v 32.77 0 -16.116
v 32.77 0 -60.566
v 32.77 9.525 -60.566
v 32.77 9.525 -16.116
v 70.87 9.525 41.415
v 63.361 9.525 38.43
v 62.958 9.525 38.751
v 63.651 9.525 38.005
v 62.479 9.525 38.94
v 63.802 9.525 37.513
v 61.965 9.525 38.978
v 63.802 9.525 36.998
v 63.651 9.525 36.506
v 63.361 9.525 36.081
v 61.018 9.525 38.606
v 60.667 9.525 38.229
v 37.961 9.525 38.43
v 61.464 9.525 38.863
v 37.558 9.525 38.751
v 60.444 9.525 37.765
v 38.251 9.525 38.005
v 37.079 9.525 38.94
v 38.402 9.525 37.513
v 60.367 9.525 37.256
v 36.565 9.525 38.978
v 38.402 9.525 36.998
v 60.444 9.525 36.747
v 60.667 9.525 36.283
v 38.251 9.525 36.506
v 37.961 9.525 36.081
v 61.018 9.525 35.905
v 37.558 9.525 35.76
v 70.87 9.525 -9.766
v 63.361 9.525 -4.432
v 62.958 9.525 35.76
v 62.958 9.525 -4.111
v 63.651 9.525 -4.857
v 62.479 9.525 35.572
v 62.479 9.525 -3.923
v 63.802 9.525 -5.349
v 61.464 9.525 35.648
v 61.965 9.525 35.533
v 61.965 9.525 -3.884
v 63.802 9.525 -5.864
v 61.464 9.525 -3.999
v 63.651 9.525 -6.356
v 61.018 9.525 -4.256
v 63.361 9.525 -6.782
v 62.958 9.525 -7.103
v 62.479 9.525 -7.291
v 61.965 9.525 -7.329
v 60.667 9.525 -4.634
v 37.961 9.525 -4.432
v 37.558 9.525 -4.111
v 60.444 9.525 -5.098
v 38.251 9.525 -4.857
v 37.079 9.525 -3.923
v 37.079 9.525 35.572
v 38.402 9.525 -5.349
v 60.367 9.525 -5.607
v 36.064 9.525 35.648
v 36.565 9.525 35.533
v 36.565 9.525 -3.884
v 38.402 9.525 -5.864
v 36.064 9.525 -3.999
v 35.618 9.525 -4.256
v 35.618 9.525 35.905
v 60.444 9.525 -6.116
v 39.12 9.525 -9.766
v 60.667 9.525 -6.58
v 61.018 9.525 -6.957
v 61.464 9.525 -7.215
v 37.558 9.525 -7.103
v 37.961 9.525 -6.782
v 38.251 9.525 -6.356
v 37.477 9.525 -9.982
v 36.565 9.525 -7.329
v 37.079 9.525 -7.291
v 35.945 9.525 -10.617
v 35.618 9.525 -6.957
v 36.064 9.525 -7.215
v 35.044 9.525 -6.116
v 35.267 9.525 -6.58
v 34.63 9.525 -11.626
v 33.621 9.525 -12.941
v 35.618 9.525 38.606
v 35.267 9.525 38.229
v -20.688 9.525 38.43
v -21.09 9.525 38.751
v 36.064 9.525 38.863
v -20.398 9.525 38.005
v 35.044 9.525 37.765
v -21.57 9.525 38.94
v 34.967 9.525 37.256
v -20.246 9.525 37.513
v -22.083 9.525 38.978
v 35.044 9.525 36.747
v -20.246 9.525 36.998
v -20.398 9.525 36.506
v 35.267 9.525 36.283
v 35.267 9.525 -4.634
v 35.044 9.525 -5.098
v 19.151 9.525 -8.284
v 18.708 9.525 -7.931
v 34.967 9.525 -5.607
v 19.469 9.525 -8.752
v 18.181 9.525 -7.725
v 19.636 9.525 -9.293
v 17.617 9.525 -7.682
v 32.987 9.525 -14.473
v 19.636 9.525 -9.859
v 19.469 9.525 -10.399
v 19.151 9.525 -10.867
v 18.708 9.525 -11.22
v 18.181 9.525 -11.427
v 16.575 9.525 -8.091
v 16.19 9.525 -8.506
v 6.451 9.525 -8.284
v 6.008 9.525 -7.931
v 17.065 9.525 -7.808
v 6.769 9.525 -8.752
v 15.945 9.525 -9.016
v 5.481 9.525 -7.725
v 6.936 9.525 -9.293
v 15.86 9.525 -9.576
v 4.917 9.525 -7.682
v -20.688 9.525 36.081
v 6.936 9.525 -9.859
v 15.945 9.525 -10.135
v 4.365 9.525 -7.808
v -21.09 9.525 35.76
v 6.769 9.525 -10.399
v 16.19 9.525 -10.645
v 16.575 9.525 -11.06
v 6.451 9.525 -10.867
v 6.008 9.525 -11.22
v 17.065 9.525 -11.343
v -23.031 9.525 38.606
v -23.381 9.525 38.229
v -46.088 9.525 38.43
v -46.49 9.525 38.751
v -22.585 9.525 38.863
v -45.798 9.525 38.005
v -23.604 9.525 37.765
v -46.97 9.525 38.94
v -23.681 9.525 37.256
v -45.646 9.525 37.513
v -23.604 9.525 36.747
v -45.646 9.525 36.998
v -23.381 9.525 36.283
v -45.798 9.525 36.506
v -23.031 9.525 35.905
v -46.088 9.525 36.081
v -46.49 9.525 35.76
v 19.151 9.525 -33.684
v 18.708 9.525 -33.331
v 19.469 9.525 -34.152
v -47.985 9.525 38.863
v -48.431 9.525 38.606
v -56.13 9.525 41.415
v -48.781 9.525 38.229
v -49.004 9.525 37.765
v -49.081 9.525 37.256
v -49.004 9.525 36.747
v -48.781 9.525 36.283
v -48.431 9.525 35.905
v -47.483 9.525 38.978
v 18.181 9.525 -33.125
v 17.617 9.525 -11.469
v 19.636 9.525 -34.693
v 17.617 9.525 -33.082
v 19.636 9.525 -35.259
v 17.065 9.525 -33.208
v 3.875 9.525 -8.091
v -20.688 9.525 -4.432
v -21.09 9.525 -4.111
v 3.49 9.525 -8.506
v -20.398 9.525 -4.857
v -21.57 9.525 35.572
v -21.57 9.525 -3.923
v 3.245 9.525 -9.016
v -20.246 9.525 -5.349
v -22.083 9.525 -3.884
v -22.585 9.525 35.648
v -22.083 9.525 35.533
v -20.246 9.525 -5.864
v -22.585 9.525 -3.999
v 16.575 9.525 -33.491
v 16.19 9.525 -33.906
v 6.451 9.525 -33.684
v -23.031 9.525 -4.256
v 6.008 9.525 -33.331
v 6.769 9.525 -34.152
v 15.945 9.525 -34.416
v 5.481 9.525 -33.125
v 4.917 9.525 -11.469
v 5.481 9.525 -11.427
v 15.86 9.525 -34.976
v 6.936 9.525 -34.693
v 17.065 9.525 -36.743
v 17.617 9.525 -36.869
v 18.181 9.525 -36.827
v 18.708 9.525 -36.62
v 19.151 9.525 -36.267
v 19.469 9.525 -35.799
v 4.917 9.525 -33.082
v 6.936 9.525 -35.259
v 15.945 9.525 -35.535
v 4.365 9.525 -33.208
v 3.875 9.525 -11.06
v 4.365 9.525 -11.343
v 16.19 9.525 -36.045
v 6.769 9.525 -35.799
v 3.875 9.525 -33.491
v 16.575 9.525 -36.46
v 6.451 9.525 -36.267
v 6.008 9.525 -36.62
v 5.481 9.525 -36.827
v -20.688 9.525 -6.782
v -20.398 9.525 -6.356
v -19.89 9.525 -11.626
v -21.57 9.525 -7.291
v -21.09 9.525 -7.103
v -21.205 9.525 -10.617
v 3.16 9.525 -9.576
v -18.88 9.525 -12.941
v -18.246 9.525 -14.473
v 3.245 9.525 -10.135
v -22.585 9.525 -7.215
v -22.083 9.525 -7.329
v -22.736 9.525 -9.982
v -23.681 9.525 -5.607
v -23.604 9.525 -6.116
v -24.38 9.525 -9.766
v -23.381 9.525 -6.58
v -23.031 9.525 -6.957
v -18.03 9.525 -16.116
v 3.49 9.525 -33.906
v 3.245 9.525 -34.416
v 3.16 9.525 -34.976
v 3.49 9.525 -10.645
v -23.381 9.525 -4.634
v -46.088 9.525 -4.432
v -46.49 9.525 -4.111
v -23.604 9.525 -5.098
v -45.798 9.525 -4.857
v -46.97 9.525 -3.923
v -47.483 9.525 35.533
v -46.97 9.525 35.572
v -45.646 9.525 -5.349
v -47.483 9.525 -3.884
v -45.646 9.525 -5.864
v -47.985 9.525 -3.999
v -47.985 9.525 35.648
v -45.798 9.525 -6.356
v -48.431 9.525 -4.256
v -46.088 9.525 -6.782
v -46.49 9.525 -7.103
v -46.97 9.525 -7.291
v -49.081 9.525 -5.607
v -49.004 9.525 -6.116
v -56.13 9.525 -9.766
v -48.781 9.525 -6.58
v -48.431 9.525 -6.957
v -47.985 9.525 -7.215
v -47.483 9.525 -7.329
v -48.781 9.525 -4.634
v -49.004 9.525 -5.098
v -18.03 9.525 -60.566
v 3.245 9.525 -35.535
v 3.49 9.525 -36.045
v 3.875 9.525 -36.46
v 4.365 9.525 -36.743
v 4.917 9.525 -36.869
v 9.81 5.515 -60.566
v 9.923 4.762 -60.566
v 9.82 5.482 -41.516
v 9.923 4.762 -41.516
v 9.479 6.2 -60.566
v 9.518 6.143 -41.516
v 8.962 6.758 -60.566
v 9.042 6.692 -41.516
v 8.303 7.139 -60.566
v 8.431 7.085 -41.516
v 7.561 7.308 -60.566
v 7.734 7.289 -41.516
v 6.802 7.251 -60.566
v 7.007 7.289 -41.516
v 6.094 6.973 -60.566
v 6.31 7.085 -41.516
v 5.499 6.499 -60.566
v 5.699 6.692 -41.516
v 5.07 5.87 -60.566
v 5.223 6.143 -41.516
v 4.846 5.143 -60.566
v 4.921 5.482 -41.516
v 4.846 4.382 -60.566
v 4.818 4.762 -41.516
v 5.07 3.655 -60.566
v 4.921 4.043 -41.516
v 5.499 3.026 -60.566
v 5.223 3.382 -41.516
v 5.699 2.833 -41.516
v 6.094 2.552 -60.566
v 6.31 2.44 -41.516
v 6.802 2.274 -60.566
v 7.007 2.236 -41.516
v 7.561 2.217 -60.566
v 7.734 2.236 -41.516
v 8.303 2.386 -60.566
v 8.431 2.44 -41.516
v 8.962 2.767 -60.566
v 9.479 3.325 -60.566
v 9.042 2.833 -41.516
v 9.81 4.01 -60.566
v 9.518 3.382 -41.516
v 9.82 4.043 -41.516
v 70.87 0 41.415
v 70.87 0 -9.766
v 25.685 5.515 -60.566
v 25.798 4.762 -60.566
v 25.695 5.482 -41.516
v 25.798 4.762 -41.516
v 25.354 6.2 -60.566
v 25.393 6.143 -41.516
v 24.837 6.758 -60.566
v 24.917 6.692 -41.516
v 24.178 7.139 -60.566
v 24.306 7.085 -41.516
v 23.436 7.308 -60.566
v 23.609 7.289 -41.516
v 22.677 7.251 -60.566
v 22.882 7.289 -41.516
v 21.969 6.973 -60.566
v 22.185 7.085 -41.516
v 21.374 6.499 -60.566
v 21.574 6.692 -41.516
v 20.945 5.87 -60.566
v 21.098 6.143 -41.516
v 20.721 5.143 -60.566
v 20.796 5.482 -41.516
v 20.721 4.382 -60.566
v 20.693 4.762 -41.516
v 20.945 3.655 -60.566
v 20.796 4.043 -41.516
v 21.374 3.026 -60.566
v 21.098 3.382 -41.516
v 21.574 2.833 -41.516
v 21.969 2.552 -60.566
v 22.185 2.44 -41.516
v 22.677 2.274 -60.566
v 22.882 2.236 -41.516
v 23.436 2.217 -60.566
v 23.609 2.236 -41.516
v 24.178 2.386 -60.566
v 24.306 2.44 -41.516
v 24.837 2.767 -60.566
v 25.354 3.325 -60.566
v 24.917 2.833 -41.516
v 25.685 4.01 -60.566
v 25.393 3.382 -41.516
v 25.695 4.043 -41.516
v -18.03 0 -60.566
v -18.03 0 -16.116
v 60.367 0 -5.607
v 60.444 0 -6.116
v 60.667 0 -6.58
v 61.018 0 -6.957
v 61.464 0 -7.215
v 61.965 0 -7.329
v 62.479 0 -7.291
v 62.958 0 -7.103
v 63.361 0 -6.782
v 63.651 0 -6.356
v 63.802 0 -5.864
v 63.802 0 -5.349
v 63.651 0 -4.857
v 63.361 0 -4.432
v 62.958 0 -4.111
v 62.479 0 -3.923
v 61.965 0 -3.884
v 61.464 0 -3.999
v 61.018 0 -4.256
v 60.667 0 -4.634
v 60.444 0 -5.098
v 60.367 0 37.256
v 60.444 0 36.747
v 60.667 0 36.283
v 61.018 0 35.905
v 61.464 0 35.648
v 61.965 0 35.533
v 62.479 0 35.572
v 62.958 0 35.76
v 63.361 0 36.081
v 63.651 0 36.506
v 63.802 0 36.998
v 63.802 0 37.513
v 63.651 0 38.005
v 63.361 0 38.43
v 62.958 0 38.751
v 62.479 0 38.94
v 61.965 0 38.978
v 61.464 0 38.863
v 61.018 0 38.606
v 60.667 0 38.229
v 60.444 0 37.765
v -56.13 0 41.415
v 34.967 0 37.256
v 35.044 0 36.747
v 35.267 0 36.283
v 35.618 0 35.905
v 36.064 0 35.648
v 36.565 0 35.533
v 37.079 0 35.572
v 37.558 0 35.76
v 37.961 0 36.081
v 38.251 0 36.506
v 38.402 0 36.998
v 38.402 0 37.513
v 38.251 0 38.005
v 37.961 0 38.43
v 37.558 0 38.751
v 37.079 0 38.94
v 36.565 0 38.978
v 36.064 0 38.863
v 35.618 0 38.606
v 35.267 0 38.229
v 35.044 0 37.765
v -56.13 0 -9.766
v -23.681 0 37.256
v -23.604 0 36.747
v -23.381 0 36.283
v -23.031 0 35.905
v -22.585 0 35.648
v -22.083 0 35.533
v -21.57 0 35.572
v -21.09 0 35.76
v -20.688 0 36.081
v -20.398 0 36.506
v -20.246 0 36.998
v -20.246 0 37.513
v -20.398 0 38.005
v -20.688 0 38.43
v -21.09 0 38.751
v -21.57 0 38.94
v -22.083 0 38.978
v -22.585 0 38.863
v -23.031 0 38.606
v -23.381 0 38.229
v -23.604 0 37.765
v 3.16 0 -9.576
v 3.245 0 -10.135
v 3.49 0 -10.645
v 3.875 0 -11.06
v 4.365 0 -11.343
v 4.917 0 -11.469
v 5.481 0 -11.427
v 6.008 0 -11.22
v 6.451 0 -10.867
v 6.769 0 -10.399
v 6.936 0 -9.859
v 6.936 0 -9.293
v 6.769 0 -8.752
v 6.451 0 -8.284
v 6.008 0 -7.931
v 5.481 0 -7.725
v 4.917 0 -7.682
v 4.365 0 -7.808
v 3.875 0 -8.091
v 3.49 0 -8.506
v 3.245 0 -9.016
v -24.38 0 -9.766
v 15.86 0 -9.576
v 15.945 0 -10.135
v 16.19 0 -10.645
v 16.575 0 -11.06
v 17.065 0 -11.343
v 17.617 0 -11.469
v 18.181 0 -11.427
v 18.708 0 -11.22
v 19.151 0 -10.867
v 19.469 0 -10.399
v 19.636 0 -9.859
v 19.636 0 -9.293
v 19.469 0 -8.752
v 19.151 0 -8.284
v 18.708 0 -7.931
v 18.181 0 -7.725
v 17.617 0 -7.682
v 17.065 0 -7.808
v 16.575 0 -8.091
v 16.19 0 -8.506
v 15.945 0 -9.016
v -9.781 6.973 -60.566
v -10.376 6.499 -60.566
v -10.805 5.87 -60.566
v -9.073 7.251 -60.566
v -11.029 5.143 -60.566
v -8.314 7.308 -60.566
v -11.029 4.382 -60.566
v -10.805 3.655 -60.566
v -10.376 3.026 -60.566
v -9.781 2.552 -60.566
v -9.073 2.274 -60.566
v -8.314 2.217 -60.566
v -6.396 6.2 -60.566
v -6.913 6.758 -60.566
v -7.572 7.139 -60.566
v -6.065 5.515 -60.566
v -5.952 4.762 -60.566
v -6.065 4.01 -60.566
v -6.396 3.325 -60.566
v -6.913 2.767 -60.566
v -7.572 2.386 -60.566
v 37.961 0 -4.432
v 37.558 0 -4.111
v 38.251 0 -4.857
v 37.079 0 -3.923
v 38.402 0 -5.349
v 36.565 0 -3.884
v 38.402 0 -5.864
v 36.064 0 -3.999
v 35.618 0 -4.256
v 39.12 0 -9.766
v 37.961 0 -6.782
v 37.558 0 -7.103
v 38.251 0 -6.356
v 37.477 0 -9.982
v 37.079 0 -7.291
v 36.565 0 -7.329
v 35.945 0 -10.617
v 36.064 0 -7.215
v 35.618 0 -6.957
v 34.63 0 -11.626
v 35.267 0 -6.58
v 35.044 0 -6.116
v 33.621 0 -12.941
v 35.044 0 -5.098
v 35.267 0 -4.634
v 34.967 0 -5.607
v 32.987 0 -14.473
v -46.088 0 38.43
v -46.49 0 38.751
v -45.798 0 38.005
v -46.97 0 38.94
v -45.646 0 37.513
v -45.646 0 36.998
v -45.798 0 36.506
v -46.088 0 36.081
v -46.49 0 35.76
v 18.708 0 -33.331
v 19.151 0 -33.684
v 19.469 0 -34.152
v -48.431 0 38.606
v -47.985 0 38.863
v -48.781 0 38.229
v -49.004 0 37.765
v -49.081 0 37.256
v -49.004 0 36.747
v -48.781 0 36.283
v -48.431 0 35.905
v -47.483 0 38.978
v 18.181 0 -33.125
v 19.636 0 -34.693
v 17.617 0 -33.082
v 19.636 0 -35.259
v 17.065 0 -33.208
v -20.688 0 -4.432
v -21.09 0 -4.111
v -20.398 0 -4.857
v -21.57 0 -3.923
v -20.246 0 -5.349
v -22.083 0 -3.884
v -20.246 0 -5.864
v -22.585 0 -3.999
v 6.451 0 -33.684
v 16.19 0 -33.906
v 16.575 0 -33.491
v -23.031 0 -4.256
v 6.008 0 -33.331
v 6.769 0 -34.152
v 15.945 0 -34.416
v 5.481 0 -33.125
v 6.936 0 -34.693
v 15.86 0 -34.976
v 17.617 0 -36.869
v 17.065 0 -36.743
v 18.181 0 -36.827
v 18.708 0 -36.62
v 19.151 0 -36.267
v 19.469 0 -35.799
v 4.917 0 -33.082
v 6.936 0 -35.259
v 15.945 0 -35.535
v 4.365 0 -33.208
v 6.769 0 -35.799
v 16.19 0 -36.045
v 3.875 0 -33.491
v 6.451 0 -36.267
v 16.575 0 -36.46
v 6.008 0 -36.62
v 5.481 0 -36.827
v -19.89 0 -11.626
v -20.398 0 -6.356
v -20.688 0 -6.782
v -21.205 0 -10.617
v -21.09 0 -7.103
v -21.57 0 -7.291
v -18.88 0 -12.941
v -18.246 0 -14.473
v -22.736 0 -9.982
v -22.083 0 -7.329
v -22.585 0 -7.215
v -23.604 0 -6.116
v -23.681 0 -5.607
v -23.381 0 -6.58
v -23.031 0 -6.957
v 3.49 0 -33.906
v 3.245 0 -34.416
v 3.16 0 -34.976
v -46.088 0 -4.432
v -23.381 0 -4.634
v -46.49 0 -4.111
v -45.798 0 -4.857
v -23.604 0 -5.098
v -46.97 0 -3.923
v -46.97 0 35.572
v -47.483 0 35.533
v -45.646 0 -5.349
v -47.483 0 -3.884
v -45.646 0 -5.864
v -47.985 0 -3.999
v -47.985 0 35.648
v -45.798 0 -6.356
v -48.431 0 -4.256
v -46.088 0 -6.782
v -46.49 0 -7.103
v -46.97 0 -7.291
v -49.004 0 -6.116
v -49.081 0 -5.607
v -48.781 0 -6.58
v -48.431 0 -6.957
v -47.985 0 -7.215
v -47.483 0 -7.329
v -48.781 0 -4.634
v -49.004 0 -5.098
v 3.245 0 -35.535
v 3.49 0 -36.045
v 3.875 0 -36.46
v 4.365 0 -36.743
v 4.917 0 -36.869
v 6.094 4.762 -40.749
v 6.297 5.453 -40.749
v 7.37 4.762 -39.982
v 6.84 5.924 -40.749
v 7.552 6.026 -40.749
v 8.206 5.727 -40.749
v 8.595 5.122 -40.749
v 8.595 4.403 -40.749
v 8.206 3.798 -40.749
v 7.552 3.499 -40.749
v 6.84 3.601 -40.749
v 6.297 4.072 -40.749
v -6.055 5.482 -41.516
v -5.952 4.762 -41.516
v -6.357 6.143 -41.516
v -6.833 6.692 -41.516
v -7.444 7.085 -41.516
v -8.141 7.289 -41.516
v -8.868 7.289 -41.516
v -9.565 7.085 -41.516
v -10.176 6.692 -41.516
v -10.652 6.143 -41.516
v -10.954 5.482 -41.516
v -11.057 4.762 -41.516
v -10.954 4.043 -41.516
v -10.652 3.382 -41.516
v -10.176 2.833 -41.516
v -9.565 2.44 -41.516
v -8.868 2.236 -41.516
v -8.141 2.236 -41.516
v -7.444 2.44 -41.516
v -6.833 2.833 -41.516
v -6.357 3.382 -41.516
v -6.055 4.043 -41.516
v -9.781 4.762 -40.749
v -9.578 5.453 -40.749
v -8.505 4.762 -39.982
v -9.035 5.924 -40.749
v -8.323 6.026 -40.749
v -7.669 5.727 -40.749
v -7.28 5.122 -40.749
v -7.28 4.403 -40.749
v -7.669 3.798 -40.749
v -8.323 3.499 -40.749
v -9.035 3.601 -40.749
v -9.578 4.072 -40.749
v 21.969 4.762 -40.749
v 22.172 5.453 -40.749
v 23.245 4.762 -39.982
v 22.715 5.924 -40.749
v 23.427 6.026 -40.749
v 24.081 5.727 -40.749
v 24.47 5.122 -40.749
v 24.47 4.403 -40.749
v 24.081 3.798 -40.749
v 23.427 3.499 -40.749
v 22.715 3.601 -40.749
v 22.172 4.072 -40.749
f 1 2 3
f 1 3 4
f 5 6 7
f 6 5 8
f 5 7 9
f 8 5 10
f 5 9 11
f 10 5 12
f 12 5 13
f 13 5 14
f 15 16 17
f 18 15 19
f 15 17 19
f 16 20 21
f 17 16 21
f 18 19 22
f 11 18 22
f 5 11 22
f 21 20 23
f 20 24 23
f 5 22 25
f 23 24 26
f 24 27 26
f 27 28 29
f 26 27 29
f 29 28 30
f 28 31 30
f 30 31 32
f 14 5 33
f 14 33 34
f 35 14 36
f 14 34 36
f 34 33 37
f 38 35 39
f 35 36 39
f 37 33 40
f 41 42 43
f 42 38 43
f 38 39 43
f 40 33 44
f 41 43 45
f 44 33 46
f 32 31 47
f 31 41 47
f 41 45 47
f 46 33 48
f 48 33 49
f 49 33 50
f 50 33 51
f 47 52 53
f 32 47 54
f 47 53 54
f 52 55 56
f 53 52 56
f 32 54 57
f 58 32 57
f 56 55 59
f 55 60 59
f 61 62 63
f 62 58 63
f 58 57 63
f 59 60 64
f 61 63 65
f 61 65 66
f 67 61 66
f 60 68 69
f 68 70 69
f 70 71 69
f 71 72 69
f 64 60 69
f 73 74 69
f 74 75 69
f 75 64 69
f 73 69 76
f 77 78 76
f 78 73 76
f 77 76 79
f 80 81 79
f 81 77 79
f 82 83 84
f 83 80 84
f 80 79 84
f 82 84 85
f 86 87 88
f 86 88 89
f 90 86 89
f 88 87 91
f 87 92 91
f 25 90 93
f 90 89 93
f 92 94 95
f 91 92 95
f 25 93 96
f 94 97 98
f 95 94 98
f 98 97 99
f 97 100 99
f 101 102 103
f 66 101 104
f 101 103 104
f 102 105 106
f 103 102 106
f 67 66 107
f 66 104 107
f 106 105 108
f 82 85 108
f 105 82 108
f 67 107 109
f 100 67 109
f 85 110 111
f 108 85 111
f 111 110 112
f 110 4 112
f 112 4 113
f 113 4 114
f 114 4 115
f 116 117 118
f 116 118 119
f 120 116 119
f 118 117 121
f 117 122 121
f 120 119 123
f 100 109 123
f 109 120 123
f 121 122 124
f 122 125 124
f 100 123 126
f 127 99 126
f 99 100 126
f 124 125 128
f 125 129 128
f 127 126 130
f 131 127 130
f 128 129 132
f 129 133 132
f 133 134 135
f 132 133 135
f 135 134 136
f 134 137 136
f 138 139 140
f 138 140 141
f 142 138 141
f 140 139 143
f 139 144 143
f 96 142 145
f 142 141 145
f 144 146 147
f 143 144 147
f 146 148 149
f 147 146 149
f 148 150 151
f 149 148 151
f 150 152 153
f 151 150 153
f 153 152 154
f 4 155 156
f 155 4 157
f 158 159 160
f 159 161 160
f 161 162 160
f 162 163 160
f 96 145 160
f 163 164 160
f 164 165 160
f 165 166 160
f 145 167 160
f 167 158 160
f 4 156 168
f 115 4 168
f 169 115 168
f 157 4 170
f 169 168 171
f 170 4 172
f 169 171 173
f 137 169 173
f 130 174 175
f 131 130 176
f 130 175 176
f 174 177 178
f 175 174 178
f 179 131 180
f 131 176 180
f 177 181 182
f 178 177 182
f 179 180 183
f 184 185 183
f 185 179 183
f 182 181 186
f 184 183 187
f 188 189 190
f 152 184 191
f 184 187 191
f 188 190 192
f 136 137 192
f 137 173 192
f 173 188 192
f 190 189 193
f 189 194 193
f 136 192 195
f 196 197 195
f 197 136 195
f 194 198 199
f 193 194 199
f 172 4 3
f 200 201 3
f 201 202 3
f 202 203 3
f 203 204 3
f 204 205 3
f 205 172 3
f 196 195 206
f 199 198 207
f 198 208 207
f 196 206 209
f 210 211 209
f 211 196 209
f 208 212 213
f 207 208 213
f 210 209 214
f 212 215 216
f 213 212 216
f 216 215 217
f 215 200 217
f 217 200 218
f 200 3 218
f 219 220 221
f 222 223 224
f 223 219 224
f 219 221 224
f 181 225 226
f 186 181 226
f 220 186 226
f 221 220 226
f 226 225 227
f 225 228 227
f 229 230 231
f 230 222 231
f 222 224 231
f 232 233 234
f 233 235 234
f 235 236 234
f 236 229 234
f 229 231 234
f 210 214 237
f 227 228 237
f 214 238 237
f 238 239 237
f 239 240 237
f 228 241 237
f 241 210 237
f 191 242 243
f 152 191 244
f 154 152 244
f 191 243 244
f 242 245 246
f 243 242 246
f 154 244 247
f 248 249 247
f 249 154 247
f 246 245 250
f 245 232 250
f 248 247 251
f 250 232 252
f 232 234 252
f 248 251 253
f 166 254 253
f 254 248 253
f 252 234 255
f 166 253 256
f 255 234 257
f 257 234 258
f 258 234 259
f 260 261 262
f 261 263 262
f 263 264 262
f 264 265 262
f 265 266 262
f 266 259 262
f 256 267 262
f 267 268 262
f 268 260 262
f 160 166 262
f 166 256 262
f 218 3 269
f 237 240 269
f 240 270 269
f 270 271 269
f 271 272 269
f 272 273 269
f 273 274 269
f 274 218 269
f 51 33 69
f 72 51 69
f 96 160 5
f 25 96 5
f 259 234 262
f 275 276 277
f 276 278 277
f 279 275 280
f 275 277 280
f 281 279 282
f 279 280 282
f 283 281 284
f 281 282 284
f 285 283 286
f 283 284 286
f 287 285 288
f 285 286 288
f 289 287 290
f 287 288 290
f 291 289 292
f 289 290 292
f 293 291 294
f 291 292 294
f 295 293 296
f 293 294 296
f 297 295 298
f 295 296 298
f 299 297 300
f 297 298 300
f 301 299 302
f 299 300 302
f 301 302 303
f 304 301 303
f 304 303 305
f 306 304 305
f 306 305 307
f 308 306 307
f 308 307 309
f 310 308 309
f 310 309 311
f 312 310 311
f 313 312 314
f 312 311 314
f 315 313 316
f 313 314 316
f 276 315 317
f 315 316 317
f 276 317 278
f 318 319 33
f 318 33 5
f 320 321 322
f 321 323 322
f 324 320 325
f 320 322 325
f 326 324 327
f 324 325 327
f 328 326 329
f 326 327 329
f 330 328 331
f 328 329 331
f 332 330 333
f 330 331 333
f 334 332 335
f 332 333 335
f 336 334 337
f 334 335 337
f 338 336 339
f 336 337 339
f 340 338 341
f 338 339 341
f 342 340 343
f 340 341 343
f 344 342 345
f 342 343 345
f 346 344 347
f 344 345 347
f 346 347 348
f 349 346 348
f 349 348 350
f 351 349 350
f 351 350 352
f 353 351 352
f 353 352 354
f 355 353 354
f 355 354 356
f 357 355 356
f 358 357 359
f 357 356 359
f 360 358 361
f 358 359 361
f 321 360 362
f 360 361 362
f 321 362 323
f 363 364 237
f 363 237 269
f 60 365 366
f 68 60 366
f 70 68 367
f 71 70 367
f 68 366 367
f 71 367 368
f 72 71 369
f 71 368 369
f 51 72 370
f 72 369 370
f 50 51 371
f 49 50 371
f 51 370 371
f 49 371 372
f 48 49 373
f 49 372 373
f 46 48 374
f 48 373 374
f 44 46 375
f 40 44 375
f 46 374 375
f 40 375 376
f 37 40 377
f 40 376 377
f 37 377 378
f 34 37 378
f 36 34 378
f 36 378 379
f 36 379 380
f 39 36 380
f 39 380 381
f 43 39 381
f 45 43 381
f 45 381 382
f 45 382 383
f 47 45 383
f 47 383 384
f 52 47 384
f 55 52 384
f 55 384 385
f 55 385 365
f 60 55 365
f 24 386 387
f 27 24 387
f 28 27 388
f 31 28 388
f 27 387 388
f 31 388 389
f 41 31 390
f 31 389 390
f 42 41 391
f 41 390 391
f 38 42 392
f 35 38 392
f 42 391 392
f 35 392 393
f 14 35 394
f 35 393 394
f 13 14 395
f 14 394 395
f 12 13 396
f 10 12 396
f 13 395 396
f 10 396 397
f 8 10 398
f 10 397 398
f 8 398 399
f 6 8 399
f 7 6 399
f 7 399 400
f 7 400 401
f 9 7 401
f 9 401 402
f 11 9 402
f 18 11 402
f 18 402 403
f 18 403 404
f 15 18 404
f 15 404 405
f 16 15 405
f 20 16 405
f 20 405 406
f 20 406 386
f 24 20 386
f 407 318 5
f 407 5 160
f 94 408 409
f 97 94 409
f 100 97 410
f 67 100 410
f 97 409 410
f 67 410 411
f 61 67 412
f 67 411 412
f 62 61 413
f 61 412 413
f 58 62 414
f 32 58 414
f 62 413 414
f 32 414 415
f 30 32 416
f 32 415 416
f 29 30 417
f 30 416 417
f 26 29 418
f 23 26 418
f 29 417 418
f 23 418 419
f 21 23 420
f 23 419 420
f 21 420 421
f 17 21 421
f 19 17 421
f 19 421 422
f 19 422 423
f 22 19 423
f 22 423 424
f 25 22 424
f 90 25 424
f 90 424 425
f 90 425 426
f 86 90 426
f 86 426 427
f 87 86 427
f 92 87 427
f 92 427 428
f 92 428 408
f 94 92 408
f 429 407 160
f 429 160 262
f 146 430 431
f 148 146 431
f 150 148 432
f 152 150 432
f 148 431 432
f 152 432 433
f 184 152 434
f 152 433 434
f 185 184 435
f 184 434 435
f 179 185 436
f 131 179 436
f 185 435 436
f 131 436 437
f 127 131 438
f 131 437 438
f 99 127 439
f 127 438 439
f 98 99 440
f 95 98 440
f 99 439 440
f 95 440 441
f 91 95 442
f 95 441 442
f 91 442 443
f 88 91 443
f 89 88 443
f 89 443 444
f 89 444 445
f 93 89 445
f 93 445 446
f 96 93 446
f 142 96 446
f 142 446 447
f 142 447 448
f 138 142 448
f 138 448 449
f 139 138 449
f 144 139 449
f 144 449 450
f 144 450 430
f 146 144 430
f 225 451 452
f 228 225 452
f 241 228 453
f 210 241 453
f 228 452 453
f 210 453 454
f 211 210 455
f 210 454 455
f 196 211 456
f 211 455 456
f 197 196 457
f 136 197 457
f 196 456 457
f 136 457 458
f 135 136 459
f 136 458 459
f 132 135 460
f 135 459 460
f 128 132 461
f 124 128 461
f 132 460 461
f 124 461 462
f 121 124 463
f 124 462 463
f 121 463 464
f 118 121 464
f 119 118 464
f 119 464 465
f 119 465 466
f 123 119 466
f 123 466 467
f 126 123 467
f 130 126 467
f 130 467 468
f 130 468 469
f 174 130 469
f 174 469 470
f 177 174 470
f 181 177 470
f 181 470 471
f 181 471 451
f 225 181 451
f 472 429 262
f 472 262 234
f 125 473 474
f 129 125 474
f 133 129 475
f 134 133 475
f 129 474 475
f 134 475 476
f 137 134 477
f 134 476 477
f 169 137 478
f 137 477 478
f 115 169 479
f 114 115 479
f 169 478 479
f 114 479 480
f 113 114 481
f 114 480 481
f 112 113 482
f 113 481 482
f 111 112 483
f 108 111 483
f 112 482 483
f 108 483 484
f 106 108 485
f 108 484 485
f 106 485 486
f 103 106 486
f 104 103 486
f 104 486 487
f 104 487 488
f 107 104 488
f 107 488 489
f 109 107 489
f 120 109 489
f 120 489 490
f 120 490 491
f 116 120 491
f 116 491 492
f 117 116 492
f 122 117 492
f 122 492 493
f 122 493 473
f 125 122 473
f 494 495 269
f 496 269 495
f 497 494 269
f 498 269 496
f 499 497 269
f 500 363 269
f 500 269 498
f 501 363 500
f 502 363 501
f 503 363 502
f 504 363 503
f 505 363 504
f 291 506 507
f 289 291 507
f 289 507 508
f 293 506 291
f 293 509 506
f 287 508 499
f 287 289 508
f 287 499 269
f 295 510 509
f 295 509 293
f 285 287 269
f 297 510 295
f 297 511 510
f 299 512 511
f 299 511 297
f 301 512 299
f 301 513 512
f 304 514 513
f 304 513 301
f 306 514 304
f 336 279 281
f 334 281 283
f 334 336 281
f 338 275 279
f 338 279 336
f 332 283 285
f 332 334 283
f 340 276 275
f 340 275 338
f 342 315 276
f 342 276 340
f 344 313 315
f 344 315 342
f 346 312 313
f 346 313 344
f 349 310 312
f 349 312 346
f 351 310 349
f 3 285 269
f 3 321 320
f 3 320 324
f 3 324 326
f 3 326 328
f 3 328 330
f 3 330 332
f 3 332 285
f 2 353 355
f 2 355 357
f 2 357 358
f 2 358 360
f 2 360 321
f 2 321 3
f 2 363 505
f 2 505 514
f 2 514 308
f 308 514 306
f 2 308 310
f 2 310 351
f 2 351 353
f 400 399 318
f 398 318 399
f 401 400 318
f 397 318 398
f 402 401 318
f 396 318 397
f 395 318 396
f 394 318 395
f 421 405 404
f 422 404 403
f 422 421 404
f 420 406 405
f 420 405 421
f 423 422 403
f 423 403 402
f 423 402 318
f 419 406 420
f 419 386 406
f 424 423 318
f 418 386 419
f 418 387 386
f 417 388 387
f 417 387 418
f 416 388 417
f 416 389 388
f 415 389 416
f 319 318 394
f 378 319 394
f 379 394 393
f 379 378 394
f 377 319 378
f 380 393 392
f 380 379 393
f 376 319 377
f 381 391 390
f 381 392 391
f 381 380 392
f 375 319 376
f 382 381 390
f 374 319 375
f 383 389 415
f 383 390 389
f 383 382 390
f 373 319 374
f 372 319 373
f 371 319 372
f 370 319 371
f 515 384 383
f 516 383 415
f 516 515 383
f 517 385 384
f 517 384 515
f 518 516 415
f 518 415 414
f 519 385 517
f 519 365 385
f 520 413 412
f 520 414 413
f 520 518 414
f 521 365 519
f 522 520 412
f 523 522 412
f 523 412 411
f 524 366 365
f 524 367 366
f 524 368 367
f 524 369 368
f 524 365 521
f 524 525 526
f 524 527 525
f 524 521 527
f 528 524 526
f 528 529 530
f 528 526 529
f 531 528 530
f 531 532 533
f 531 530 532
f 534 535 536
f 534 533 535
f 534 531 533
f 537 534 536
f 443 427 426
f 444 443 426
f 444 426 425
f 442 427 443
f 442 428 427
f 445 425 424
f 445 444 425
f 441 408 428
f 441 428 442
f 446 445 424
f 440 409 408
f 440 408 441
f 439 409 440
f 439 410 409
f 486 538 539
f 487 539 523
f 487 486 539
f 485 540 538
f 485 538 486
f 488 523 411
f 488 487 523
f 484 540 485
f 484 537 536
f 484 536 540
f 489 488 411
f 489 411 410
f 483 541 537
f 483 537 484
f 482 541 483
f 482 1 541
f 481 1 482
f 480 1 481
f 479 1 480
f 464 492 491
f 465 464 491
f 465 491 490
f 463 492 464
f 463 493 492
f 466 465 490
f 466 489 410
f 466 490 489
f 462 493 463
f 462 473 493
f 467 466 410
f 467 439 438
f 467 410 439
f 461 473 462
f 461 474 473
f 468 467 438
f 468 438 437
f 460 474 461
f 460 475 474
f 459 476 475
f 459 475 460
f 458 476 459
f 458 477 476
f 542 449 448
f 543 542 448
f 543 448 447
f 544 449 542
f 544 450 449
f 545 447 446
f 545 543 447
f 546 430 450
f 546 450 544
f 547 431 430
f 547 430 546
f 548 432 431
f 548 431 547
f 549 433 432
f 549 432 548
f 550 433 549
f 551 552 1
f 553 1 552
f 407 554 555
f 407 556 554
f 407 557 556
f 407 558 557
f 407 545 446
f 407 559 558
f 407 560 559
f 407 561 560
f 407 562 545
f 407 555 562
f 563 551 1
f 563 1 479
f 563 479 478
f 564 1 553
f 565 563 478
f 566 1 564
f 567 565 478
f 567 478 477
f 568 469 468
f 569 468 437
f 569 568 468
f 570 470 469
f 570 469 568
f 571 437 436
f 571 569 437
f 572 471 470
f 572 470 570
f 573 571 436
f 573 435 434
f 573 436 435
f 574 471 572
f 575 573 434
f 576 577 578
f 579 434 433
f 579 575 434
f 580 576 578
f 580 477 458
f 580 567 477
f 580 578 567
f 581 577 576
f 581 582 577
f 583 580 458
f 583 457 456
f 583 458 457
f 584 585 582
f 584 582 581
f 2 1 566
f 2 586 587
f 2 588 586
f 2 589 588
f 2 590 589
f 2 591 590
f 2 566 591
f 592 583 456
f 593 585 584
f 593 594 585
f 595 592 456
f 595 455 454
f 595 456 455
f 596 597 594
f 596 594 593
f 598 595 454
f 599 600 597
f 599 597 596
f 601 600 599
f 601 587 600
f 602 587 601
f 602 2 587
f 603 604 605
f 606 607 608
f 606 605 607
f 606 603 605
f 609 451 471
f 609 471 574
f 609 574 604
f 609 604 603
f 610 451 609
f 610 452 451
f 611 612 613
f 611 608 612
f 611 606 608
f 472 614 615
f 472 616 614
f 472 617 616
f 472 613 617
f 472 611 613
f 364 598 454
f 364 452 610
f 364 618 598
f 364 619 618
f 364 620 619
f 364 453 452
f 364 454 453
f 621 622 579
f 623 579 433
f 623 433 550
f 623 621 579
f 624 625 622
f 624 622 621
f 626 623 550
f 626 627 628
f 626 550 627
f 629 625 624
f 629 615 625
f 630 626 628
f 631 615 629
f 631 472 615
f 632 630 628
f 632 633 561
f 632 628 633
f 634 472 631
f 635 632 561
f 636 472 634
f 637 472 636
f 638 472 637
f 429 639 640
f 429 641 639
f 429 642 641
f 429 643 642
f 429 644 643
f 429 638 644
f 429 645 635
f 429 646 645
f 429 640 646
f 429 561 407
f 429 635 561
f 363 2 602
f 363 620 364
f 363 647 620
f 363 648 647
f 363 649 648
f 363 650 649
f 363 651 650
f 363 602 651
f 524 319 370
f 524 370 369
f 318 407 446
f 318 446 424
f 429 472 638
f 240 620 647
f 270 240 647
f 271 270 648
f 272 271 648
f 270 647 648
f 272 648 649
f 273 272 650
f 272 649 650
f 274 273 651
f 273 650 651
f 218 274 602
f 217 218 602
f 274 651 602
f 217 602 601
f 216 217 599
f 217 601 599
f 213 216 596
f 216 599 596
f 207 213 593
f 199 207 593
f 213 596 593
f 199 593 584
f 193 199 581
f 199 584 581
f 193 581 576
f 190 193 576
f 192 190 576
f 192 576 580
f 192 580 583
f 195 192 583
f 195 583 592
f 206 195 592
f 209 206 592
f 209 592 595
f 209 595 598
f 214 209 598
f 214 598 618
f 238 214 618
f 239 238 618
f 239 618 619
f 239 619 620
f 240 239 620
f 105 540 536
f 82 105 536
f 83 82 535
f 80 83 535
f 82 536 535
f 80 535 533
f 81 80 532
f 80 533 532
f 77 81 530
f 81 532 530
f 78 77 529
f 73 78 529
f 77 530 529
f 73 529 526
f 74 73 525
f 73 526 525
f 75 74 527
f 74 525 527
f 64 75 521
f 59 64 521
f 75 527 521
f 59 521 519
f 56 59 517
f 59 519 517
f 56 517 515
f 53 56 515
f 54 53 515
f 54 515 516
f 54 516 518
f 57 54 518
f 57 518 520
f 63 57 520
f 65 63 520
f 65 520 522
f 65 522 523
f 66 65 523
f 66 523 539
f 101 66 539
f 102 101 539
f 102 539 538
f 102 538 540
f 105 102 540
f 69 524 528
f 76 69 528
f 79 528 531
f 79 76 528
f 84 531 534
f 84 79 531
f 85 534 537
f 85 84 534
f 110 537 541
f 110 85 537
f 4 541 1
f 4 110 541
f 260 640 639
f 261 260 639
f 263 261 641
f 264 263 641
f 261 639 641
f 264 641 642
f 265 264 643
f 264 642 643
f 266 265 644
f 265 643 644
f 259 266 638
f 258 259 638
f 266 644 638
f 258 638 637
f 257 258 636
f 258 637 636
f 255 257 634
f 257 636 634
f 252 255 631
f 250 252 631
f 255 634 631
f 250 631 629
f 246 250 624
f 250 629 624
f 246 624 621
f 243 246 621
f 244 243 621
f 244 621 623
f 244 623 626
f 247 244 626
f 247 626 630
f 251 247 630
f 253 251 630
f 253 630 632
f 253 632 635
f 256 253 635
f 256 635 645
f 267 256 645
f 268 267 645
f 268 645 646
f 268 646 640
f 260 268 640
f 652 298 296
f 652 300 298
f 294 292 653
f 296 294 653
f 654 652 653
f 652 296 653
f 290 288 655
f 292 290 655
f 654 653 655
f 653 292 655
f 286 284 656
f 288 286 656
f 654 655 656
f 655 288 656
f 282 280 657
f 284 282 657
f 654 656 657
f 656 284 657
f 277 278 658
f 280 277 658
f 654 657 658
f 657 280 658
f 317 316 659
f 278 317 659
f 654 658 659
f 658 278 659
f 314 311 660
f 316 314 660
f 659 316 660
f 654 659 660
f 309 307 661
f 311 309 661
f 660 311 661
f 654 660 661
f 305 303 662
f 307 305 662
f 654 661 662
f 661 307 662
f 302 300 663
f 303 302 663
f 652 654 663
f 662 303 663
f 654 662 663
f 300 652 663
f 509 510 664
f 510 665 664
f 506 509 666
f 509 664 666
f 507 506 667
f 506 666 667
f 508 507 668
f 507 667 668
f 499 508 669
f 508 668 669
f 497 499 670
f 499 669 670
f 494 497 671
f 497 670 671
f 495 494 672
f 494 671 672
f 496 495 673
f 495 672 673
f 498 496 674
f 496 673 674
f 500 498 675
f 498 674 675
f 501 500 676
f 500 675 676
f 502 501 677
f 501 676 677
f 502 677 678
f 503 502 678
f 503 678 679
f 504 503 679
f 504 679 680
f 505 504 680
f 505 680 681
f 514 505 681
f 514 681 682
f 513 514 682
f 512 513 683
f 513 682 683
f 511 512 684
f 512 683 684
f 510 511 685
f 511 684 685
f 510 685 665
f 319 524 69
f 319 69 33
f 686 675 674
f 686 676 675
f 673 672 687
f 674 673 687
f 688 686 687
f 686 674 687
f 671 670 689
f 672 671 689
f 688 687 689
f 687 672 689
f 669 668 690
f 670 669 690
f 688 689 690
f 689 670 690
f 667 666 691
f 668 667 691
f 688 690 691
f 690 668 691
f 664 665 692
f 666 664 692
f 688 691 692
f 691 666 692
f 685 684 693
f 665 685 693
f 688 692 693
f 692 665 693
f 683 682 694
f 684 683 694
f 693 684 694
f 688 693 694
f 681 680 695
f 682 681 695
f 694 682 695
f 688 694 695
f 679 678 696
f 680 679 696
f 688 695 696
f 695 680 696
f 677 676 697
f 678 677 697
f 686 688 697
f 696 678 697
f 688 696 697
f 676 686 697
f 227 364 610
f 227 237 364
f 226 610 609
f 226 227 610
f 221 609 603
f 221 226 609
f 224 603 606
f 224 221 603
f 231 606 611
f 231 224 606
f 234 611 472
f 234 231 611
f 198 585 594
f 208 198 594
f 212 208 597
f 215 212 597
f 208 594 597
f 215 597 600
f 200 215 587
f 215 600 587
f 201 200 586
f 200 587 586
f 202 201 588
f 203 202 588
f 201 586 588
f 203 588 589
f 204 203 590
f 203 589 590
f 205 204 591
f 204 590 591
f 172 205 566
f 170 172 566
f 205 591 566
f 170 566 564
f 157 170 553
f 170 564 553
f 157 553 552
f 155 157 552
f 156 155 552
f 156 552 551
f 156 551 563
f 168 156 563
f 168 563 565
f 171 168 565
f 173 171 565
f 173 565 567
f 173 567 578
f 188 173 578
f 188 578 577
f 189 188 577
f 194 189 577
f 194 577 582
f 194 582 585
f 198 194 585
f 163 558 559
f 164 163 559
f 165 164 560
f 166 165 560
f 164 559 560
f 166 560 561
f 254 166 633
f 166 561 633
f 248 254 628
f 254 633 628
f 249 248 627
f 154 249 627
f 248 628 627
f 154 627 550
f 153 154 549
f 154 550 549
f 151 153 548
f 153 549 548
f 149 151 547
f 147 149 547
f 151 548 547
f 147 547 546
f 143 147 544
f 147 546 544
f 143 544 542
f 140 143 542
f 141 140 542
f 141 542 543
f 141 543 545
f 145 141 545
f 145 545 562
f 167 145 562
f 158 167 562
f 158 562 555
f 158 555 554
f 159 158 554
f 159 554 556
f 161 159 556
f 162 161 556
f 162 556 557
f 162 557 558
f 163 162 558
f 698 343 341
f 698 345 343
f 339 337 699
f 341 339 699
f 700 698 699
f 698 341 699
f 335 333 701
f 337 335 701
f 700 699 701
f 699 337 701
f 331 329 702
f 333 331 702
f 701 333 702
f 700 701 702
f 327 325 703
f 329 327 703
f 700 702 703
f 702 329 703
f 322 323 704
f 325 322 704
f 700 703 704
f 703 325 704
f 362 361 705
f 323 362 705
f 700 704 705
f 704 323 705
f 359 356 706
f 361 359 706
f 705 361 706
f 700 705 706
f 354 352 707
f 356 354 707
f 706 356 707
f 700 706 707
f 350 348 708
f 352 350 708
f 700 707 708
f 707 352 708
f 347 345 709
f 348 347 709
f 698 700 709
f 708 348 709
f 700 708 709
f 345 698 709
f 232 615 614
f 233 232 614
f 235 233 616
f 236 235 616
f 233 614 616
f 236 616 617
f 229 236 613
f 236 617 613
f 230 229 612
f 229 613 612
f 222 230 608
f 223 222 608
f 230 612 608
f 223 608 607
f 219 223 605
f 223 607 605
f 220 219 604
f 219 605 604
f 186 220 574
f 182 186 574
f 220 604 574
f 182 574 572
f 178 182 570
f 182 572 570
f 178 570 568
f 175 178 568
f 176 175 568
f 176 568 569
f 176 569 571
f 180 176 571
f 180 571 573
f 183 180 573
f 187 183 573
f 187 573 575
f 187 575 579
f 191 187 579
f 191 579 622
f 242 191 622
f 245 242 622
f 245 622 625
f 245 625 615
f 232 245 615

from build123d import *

# Parameters (mm, degrees)
BOSS_EXTRUDE1_DEPTH         = 9.525
F_8_32_TAPPED_HOLE1_D       = 3.4544
F_10_24_TAPPED_HOLE1_D      = 3.7973
F_1_4_20_TAPPED_HOLE1_D     = 5.1054
F_1_4_20_TAPPED_HOLE1_DEPTH = 19.05
F_1_4_20_TAPPED_HOLE1_TIP   = 1.533816902
FILLET1_R                   = 6.35


with BuildPart() as part:
    # Sketch1 → Boss-Extrude1 (new body)
    with BuildSketch(Plane(origin=(0, 0, 0), x_dir=(1, 0, 0), z_dir=(0, 1, 0))):
        Polygon((32.770273681, 9.766101756), (70.870273681, 9.766101756), (70.870273681, -41.414898244), (-56.129726319, -41.414898244), (-56.129726319, 9.766101756), (-18.029726319, 9.766101756), (-18.029726319, 60.566101756), (32.770273681, 60.566101756), align=None)
    extrude(amount=BOSS_EXTRUDE1_DEPTH)

    # #8-32 Tapped Hole1 (through all)
    with Locations(Plane(origin=(0, 9.525, 0), x_dir=(1, 0, 0), z_dir=(0, 1, 0))):
        with Locations((-47.354026319, 5.606851756), (-47.354026319, -37.255648244), (-21.954026319, -37.255648244), (-21.954026319, 5.606851756), (62.094573681, 5.606851756), (62.094573681, -37.255648244), (36.694573681, -37.255648244), (36.694573681, 5.606851756)):
            Hole(F_8_32_TAPPED_HOLE1_D / 2)

    # #10-24 Tapped Hole1 (through all)
    with Locations(Plane(origin=(0, 9.525, 0), x_dir=(1, 0, 0), z_dir=(0, 1, 0))):
        with Locations((5.058873681, 34.975601756), (17.758873681, 34.975601756), (5.058873681, 9.575601756), (17.758873681, 9.575601756)):
            Hole(F_10_24_TAPPED_HOLE1_D / 2)

    # 1/4-20 Tapped Hole1
    with Locations(Plane(origin=(0, 0, -60.566101756), x_dir=(-1, 0, 0), z_dir=(0, 0, -1))):
        with Locations((8.504726319, 4.7625), (-7.370273681, 4.7625), (-23.245273681, 4.7625)):
            Hole(F_1_4_20_TAPPED_HOLE1_D / 2, depth=F_1_4_20_TAPPED_HOLE1_DEPTH)
            with Locations((0, 0, -(F_1_4_20_TAPPED_HOLE1_DEPTH + F_1_4_20_TAPPED_HOLE1_TIP / 2))):  # 118° drill point
                Cone(0, F_1_4_20_TAPPED_HOLE1_D / 2, F_1_4_20_TAPPED_HOLE1_TIP, mode=Mode.SUBTRACT)

    # Fillet1
    fillet1_edges = [part.edges().sort_by_distance(p)[0] for p in [
        (32.770273681, 4.7625, -9.766101756),
        (-18.029726319, 4.7625, -9.766101756),
    ]]
    fillet(fillet1_edges, radius=FILLET1_R)


solid = part.part
